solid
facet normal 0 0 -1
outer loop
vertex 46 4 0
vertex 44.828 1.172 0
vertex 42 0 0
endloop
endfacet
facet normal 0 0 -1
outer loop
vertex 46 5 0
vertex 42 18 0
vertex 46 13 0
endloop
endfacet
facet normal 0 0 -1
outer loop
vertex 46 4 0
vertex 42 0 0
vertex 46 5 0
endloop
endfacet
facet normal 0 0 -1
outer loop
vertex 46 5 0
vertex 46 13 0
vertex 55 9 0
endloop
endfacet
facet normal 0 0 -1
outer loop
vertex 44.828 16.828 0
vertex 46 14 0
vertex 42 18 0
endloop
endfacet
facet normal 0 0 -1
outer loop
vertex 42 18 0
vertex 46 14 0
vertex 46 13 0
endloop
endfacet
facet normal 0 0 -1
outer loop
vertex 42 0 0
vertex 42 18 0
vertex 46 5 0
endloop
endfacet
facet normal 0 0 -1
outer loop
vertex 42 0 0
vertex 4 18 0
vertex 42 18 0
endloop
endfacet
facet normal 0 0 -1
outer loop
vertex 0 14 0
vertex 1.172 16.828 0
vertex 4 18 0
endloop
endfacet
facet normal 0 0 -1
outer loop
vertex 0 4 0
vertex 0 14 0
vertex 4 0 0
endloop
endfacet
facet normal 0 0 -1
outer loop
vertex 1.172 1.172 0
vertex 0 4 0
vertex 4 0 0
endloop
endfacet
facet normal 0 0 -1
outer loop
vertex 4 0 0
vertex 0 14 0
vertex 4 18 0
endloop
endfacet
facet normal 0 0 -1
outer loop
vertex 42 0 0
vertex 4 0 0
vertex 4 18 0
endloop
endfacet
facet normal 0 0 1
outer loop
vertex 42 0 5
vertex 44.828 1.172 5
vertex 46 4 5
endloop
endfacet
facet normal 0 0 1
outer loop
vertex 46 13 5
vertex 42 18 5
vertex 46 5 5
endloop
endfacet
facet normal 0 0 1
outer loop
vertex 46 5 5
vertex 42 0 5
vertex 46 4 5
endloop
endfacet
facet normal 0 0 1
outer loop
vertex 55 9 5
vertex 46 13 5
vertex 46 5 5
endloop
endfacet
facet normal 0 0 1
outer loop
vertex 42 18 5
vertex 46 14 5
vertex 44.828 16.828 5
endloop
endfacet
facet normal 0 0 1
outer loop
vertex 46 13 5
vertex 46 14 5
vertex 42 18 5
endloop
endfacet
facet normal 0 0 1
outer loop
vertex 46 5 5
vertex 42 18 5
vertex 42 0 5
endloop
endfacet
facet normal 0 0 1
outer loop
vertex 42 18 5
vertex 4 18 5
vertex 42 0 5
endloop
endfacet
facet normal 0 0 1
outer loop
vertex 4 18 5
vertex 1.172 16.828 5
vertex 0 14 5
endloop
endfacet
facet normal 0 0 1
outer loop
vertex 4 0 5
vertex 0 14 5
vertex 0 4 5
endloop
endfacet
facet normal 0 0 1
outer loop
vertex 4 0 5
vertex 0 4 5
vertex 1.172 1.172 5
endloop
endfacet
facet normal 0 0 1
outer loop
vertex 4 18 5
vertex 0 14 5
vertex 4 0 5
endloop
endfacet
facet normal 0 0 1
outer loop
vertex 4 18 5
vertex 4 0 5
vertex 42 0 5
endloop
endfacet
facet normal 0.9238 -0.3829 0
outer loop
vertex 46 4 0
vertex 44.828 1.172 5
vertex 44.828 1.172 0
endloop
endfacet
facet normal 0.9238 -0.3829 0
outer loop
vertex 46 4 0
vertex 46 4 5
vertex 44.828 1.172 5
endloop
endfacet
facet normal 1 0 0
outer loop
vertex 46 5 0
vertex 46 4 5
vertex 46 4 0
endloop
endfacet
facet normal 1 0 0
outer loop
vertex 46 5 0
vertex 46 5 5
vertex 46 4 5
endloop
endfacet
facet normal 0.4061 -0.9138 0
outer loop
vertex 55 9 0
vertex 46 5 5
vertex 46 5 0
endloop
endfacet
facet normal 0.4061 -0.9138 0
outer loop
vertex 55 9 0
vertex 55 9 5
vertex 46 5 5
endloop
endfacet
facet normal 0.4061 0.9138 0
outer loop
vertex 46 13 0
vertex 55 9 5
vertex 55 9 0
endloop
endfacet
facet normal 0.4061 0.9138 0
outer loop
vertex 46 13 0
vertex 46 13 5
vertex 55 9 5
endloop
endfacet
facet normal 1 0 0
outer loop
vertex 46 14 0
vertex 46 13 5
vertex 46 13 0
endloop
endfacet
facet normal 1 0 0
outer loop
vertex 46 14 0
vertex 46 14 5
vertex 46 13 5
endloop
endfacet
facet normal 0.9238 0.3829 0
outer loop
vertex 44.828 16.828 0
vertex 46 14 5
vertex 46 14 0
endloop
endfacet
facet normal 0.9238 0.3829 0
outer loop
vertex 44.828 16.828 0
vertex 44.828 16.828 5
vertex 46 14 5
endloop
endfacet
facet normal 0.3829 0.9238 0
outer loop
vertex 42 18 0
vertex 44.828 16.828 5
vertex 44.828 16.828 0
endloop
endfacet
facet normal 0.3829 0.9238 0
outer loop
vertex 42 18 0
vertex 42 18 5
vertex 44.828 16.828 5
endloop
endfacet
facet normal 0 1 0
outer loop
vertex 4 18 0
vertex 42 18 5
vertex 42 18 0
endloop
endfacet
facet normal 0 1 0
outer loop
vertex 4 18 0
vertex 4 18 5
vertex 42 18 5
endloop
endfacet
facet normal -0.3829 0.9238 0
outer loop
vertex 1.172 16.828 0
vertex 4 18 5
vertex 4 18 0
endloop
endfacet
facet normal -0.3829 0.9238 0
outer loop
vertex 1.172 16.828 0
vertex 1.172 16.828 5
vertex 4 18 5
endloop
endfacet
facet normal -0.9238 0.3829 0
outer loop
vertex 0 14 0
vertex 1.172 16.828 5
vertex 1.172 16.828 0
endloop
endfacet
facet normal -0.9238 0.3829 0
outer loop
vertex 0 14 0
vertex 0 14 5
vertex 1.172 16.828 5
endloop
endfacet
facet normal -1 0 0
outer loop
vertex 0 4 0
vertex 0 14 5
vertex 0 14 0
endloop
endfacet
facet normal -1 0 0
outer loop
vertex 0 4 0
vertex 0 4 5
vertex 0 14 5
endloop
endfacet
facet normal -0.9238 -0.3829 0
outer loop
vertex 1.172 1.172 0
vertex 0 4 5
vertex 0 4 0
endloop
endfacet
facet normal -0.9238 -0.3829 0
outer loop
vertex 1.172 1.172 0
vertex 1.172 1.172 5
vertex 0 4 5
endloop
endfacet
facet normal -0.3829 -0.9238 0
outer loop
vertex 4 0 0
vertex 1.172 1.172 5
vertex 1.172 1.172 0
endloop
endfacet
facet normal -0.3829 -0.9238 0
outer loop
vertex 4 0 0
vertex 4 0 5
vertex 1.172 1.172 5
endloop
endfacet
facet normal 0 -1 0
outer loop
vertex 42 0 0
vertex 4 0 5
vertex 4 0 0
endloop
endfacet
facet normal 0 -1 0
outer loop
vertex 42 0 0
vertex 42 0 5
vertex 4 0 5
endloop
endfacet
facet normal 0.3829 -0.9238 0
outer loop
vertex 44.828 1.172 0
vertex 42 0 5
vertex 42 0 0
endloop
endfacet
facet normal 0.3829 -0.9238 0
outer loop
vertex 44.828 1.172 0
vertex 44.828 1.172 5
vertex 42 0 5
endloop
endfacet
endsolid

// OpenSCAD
$fn = 32;

// ----------------------------------------------------------------------
// Ratchet pawl: 46 x 18 mm body, beak 9 mm с правого торца
// ----------------------------------------------------------------------

// --- parameters (mm) ---
profile_height = 5;       // extrusion height
profile_points = 15;      // points of the closed outline

profile = [[0, 4], [1.172, 1.172], [4, 0], [42, 0], [44.828, 1.172], [46, 4], [46, 5], [55, 9], [46, 13], [46, 14], [44.828, 16.828], [42, 18], [4, 18], [1.172, 16.828], [0, 14]];  // single closed polygon, 15 points, counter clockwise

// --- the one profile operation ---
linear_extrude(height = profile_height) polygon(points = profile);
